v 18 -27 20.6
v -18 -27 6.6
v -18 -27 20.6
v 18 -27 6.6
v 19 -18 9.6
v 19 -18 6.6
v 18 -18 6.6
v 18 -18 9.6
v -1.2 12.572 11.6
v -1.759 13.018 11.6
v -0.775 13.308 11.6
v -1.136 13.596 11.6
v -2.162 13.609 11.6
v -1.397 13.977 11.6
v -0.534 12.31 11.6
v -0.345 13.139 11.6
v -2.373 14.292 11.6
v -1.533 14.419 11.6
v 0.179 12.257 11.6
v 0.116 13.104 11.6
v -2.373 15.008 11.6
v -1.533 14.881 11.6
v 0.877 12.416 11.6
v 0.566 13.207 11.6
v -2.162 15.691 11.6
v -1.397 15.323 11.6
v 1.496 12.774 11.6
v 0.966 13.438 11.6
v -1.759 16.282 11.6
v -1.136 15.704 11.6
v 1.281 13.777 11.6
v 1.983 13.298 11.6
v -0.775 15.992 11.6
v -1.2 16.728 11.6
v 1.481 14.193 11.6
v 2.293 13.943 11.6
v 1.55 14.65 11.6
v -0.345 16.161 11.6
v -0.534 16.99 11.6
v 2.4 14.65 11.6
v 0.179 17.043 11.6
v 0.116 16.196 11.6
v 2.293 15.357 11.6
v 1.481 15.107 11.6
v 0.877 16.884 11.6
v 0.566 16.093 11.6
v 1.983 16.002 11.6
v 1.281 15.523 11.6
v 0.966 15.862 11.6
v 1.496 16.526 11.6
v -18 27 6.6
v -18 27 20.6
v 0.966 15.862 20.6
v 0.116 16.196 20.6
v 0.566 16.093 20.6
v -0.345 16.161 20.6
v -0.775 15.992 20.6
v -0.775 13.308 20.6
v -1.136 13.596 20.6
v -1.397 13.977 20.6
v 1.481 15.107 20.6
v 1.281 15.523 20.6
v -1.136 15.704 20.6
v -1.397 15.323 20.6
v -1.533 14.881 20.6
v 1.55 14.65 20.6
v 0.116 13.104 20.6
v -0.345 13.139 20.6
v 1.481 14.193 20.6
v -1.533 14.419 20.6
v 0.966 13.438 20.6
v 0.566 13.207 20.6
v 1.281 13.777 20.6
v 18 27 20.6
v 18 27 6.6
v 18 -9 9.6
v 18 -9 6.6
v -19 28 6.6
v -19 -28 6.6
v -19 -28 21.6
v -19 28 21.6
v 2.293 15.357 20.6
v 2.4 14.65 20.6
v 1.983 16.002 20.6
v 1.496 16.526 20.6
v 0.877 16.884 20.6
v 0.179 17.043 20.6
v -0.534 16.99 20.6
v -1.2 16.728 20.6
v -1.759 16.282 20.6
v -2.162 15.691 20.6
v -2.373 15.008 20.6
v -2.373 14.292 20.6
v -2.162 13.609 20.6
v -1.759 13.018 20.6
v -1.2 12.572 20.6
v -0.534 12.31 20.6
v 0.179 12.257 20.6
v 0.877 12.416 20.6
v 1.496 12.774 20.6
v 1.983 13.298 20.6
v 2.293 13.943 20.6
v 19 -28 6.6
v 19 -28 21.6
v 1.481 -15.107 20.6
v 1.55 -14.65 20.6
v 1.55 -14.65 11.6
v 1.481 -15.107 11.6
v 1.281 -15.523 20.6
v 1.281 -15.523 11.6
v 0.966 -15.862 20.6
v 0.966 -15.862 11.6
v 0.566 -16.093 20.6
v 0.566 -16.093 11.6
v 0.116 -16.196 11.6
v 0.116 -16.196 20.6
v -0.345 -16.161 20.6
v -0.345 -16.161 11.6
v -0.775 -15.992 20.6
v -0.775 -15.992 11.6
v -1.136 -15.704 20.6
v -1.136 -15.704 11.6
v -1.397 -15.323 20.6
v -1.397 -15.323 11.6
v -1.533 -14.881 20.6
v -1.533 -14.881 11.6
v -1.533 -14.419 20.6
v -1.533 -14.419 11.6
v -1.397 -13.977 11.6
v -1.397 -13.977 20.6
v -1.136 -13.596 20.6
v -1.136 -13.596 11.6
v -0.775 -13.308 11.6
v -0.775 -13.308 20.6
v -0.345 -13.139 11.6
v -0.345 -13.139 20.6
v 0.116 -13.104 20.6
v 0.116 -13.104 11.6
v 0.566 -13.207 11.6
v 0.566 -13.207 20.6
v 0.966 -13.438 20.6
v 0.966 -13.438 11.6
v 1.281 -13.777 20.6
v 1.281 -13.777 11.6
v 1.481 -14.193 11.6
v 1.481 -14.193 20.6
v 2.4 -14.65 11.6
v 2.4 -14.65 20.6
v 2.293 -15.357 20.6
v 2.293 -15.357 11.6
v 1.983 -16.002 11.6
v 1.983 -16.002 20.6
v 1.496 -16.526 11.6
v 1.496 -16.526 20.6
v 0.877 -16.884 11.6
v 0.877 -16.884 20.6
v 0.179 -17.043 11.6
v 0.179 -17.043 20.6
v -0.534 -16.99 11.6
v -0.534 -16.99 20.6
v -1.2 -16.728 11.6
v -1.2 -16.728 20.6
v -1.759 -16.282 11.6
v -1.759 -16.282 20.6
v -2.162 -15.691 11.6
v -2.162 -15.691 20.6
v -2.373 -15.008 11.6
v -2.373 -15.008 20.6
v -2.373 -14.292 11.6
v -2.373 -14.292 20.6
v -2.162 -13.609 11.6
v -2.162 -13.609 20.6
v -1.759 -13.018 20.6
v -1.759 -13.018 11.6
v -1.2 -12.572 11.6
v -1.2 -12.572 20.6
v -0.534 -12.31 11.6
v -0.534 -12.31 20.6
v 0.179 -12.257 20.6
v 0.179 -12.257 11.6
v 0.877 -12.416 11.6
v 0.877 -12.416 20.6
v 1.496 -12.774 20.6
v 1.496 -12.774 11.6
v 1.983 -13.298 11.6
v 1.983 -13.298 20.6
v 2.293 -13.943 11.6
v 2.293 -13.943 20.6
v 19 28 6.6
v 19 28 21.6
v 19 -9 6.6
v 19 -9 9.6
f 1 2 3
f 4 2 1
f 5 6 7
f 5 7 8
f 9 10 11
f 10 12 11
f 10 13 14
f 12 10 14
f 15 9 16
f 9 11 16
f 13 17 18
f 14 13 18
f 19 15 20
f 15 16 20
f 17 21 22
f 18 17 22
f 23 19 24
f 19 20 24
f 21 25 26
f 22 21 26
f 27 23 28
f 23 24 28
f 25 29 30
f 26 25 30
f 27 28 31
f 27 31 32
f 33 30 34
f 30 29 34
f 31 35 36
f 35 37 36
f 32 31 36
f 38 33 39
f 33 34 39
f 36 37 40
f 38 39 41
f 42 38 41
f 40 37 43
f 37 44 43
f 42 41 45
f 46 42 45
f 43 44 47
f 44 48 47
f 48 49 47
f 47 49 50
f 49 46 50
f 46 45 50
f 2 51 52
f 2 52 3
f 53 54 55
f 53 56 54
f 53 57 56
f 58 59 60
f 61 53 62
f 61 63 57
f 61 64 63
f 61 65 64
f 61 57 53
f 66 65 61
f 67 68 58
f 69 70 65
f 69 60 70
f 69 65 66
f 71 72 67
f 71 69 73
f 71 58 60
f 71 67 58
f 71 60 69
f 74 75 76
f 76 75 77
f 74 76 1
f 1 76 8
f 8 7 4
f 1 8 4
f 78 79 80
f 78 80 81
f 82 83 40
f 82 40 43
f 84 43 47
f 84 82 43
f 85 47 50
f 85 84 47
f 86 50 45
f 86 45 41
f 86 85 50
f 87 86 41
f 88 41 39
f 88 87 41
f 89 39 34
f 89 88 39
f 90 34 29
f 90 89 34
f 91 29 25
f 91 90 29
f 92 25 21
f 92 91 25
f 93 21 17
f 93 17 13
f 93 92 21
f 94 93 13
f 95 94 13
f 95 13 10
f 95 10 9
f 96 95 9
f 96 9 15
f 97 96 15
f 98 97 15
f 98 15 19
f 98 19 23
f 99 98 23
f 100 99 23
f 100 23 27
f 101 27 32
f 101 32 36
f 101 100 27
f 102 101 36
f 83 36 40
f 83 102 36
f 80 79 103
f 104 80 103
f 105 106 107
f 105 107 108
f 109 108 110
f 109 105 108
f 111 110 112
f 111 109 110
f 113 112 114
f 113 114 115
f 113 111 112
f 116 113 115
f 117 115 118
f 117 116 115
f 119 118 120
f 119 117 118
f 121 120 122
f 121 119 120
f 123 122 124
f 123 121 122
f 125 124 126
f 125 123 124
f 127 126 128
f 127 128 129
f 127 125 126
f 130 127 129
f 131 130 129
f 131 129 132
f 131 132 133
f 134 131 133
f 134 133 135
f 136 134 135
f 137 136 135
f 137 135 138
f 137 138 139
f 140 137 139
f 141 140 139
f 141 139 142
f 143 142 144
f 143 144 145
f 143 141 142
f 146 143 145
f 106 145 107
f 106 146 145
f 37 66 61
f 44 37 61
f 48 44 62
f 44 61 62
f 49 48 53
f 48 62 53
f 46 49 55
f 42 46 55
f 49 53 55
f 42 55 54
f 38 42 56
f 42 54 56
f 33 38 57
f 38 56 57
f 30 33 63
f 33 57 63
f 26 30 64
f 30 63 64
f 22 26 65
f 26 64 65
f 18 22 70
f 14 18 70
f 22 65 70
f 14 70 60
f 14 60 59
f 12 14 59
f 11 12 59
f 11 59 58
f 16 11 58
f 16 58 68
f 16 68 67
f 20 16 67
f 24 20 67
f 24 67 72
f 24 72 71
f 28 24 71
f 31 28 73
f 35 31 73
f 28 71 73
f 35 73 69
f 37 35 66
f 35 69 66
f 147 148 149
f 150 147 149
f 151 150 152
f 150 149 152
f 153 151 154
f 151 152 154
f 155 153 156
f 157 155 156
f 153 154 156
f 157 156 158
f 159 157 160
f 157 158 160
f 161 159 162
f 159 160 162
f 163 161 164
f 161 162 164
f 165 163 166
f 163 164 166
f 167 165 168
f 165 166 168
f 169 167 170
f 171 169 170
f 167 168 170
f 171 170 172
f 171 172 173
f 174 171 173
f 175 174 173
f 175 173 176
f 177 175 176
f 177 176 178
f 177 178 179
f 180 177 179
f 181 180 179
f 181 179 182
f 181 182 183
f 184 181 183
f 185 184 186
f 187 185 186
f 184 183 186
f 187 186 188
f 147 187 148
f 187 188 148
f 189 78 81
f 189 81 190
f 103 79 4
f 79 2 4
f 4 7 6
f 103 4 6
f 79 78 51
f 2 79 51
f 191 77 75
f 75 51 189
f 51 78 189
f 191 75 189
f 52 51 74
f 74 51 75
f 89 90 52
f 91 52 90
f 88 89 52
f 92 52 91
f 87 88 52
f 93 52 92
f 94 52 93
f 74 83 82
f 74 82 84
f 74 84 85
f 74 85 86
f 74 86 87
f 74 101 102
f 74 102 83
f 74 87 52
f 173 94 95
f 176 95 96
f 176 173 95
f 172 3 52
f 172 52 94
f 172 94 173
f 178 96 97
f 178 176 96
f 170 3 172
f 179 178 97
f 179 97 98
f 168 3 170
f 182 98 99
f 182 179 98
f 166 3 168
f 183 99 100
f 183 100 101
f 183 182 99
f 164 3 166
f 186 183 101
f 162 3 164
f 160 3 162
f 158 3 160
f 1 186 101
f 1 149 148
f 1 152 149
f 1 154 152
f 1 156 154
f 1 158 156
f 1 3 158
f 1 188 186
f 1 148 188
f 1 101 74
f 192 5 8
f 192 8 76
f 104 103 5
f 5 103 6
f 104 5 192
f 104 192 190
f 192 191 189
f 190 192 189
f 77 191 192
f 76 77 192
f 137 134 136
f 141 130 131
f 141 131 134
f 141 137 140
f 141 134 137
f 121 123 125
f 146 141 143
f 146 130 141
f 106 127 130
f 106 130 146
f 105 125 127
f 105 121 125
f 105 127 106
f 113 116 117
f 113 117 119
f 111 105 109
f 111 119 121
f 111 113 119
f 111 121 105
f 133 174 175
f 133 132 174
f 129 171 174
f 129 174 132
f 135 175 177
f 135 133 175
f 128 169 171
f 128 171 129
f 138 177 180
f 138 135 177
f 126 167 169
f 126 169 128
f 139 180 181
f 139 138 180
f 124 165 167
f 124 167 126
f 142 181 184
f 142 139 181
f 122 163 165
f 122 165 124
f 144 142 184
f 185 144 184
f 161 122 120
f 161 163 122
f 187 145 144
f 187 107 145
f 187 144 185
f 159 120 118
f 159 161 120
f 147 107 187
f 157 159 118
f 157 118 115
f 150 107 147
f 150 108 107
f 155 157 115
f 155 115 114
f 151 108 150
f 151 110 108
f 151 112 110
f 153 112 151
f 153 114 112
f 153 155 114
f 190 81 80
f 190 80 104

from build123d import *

# Parameters (mm, degrees)
SKETCH030_W     = 38
SKETCH030_H     = 56
PAD017_DEPTH    = 15
SKETCH031_W     = 36
SKETCH031_H     = 54
POCKET007_DEPTH = 14
SKETCH033_R     = 2.4
SKETCH033_R_2   = 1.55
PAD019_DEPTH    = 9
SKETCH038_W     = 9
SKETCH038_H     = 3
POCKET010_DEPTH = 5


with BuildPart() as part:
    # Sketch030 → Pad017 (new body)
    with BuildSketch(Plane.XY):
        Rectangle(SKETCH030_W, SKETCH030_H)
    extrude(amount=PAD017_DEPTH)

    # Sketch031 (on Face5 of Pad017) → Pocket007 (cut)
    with BuildSketch(Plane(origin=(0, 0, 0), x_dir=(1, 0, 0), z_dir=(0, 0, -1))):
        Rectangle(SKETCH031_W, SKETCH031_H)
    extrude(amount=-POCKET007_DEPTH, mode=Mode.SUBTRACT)

    # Sketch033 (on Face11 of Pocket007) → Pad019 (join)
    with BuildSketch(Plane(origin=(0, 0, 14), x_dir=(1, 0, 0), z_dir=(0, 0, -1))):
        with Locations((0, 14.65)):
            Circle(SKETCH033_R)
        with Locations((0, 14.65)):
            Circle(SKETCH033_R_2, mode=Mode.SUBTRACT)
    pad019 = extrude(amount=PAD019_DEPTH)

    # Mirrored009: Pad019 across XZ
    add(pad019.mirror(Plane.XZ))

    # Sketch038 (on Face3 of Mirrored009) → Pocket010 (cut)
    with BuildSketch(Plane.YZ.offset(19)):
        with Locations((-13.5, 1.5)):
            Rectangle(SKETCH038_W, SKETCH038_H)
    extrude(amount=-POCKET010_DEPTH, mode=Mode.SUBTRACT)


with BuildPart() as part_1:
    # Body007 placement: moved
    add(part.part.moved(Location((0, 0, 6.6))))


solid = part_1.part
